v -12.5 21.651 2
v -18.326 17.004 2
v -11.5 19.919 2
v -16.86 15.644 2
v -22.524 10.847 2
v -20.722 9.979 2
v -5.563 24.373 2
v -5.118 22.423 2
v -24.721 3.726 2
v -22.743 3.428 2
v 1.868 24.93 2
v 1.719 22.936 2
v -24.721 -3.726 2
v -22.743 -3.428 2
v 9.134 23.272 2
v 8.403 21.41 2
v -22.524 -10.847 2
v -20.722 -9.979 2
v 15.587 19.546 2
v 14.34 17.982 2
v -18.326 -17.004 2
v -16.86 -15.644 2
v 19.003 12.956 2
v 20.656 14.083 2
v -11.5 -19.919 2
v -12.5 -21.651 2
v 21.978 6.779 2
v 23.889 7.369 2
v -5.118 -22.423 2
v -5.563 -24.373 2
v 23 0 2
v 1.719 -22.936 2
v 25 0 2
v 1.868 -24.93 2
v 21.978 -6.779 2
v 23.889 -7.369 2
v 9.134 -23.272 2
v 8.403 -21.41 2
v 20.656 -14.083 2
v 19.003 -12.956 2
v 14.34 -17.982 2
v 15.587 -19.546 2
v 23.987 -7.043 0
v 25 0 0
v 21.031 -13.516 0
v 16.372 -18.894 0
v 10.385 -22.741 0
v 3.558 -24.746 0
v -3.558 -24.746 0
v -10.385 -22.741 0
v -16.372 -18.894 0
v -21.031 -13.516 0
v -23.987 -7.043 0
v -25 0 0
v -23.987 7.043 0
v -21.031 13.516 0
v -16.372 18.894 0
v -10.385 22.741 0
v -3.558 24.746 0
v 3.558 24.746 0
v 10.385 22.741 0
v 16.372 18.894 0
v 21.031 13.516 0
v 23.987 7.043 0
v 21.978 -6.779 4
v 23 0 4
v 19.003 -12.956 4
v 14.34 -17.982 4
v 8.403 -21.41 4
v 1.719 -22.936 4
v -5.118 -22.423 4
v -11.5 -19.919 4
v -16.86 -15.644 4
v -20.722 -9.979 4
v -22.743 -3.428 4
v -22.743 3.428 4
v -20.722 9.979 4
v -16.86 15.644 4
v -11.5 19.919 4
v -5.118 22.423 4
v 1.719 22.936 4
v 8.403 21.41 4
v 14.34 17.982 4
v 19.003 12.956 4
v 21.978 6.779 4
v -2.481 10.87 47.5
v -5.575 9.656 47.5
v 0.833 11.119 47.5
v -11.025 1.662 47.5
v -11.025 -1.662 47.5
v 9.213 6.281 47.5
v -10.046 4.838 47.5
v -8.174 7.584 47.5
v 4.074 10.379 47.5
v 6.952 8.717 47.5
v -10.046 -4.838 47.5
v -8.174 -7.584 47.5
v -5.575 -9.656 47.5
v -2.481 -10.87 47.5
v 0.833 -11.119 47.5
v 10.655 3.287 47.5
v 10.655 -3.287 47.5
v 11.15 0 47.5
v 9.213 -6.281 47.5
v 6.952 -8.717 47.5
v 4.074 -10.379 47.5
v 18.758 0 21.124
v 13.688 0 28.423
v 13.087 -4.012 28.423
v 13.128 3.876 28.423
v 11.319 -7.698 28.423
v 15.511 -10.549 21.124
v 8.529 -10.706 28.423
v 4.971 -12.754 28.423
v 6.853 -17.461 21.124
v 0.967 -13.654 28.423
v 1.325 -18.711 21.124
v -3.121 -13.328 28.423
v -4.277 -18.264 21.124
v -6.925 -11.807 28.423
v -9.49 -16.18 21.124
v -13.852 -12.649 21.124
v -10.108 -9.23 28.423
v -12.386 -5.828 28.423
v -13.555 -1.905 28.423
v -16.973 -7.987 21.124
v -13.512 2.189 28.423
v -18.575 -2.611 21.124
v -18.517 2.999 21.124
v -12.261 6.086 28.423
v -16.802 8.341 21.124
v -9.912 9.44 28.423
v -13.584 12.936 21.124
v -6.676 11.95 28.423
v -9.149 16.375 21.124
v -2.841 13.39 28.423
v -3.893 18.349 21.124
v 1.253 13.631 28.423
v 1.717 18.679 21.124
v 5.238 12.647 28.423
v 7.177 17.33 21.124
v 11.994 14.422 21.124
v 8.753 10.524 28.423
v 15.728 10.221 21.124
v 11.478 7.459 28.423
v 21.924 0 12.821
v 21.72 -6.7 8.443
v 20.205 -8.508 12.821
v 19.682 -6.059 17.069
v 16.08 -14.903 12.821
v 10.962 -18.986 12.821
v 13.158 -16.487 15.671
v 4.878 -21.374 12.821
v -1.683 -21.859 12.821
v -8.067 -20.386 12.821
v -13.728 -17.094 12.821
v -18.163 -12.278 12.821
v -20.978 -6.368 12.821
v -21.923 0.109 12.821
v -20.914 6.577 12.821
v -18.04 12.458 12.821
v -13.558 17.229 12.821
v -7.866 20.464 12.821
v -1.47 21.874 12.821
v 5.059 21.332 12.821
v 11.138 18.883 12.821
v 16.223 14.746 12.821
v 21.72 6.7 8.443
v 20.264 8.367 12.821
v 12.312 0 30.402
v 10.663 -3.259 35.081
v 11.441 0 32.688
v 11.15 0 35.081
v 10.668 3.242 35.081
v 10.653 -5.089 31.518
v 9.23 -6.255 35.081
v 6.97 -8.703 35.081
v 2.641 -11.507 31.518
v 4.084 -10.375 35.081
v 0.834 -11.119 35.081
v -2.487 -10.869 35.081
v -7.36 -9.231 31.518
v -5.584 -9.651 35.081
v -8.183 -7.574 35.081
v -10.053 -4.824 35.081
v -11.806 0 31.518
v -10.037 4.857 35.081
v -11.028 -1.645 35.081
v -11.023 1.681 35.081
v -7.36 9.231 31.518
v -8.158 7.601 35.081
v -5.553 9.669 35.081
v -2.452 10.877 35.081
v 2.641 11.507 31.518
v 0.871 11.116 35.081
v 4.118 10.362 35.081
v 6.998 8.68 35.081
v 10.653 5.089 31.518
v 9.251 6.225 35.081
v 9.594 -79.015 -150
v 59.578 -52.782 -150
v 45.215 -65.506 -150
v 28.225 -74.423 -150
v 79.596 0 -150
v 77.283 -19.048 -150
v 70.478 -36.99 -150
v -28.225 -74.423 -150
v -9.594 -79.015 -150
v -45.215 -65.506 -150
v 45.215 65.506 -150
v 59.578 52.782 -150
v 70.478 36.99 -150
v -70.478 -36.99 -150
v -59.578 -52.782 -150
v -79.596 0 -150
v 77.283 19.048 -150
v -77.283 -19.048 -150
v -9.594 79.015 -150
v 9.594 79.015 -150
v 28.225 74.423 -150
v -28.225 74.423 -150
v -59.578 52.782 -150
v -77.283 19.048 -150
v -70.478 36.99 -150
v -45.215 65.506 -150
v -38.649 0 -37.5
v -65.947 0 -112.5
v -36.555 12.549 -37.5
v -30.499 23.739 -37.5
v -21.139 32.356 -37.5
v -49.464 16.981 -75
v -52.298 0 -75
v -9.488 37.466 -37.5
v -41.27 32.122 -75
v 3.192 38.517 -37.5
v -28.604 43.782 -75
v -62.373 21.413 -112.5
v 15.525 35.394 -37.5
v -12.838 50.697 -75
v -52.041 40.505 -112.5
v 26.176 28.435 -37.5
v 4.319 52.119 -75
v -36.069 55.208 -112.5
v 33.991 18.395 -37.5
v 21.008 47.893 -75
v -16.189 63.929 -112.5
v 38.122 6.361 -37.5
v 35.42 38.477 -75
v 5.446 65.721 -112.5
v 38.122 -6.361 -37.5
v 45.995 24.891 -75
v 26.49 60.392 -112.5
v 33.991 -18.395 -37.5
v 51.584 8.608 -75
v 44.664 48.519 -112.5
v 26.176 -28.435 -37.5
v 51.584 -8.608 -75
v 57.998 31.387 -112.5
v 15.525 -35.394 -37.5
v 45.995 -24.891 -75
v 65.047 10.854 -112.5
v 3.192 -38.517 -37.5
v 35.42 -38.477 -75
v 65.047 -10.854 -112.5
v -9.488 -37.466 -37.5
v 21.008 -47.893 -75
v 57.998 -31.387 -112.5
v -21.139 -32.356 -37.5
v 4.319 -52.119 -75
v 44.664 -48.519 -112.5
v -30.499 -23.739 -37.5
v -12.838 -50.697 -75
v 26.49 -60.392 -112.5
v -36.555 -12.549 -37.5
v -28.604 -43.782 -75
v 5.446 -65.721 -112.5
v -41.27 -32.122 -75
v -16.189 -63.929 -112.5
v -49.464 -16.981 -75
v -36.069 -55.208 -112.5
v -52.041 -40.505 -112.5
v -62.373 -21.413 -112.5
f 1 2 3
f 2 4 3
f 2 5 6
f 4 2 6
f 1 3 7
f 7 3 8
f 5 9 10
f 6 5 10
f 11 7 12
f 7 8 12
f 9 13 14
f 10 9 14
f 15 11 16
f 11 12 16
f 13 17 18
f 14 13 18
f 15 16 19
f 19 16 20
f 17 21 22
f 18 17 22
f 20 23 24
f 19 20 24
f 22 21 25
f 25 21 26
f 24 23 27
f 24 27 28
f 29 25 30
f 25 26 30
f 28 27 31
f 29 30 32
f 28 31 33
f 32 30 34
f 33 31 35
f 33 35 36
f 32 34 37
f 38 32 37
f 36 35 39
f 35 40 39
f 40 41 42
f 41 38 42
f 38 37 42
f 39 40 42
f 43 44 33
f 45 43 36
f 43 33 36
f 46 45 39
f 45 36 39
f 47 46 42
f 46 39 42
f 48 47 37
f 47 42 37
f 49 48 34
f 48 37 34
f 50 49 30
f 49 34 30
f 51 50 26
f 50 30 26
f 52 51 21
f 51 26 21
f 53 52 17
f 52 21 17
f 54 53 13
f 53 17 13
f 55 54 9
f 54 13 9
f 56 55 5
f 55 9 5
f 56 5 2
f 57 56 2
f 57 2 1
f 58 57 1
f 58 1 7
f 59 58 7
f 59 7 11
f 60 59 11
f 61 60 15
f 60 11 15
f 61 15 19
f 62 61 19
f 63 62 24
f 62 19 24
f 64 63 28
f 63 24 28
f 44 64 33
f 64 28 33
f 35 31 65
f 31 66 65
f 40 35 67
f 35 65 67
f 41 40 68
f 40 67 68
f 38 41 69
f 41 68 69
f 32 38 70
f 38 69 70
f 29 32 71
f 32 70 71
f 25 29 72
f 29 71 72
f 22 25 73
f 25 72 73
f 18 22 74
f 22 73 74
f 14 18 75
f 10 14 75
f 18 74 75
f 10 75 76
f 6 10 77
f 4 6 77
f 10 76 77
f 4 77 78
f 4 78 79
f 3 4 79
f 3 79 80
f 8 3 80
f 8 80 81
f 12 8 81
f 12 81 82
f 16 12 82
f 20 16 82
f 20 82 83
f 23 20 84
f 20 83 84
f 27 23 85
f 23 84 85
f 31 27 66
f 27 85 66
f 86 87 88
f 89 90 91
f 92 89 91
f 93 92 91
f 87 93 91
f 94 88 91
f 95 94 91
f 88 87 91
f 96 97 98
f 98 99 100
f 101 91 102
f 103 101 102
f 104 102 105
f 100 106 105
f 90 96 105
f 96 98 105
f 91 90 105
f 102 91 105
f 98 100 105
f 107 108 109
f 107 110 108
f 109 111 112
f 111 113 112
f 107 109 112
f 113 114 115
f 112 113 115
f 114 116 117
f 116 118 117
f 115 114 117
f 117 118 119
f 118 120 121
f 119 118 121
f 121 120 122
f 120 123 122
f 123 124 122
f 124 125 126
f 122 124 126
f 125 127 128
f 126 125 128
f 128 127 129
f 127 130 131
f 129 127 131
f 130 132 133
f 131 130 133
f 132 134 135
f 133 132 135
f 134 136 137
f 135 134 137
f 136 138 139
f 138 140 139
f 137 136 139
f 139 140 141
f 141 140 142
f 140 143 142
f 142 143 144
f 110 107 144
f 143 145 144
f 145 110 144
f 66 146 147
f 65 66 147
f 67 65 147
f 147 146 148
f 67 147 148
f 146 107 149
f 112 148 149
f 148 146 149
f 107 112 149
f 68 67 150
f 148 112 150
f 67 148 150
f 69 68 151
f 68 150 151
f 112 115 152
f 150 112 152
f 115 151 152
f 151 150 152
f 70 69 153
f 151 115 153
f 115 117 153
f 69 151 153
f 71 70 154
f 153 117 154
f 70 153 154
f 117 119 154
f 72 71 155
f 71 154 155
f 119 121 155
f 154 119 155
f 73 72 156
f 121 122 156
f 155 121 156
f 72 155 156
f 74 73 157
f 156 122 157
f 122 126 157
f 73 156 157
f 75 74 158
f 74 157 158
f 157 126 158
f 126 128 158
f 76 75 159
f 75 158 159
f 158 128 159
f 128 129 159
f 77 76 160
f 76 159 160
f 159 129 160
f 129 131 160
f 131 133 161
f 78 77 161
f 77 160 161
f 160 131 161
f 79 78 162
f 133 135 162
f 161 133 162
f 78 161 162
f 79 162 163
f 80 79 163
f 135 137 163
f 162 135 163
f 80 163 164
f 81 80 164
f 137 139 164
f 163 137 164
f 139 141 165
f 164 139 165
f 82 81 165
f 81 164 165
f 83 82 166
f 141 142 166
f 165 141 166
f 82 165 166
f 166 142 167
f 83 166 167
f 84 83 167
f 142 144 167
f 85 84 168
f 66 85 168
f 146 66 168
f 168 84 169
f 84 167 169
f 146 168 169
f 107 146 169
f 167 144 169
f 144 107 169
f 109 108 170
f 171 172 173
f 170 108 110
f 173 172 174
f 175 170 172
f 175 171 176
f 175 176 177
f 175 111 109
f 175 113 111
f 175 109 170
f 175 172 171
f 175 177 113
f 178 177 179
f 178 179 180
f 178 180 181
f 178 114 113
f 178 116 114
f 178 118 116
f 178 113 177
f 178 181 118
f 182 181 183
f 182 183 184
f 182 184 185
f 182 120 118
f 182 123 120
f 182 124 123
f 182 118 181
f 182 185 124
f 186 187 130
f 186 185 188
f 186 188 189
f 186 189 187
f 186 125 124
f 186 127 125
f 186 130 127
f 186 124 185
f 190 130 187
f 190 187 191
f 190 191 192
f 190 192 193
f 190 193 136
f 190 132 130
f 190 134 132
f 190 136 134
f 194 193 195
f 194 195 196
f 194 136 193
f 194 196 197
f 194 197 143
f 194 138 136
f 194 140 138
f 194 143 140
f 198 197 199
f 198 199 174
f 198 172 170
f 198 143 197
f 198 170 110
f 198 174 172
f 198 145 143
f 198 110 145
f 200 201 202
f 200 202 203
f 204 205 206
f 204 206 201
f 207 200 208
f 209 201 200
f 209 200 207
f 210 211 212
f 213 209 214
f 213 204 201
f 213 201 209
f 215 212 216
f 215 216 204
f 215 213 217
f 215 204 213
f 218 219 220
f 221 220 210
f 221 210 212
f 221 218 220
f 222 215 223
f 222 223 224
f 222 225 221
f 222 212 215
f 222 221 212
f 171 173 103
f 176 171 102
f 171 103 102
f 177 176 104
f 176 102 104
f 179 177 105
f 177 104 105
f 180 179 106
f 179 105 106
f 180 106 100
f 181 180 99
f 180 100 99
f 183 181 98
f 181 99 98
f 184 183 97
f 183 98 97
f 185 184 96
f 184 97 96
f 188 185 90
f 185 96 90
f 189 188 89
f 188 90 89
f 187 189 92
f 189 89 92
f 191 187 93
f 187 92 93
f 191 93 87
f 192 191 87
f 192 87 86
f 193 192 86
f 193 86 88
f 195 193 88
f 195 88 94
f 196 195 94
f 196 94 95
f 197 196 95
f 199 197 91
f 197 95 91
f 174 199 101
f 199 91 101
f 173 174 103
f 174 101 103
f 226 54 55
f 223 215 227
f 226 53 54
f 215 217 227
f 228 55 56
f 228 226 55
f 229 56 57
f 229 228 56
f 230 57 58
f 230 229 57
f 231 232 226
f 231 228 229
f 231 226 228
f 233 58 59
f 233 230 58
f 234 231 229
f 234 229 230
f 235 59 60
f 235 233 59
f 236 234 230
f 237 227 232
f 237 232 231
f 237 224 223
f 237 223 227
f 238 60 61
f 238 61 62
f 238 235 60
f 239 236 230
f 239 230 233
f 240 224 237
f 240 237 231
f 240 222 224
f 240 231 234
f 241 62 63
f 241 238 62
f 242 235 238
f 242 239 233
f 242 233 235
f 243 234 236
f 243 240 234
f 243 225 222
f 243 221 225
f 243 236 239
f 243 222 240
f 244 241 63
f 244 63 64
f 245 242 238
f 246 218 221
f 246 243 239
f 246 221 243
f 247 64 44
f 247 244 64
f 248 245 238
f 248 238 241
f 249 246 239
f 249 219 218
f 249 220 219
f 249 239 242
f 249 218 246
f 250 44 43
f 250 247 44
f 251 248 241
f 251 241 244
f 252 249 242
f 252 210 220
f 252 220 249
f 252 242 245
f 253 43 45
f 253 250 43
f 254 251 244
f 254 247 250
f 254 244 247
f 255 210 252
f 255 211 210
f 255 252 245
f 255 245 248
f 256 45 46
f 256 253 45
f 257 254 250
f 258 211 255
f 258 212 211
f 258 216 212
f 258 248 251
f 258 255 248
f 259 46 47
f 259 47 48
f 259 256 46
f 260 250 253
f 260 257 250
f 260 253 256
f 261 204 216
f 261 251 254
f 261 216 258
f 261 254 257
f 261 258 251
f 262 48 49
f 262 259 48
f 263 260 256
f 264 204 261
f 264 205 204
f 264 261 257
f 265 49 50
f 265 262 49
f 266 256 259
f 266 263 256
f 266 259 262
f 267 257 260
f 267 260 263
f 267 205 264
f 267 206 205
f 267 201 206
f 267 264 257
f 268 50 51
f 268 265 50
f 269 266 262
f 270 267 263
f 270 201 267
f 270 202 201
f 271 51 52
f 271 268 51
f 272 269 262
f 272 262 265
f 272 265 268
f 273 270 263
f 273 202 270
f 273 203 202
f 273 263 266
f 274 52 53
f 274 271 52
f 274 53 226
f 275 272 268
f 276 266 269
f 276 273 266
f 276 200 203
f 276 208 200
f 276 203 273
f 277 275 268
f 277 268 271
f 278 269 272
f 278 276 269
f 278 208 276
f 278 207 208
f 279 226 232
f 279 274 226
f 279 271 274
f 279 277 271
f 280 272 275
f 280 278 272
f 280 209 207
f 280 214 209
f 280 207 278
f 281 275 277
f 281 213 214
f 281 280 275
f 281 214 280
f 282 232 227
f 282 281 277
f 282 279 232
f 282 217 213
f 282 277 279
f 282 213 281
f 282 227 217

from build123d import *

# Parameters (mm, degrees)
FILLET1_R = 10


with BuildPart() as part:
    # Sketch1 → Revolve1 (revolve)
    with BuildSketch(Plane.YZ, mode=Mode.PRIVATE) as revolve1_sk:
        with BuildLine():
            Line((0, 0), (-25, 0))
            Line((-25, 0), (-25, 2))
            Line((-25, 2), (-23, 2))
            Line((-23, 2), (-23, 4))
            ThreePointArc((-23, 4), (-19.907119135, 18.74298562), (-11.15, 31))
            Line((-11.15, 31), (-11.15, 47.5))
            Line((-11.15, 47.5), (0, 47.5))
            Line((0, 47.5), (0, 0))
        make_face()
    revolve(revolve1_sk.sketch.rotate(Axis((0, 0, 47.5), (0, 0, -1)), 270), axis=Axis((0, 0, 47.5), (0, 0, -1)))

    # Fillet1
    fillet1_edges = [part.edges().sort_by_distance(p)[0] for p in [
        (-11.15, 0, 31),
    ]]
    fillet(fillet1_edges, radius=FILLET1_R)

    # Sketch2 → Revolve2 (revolve)
    with BuildSketch(Plane.YZ, mode=Mode.PRIVATE) as revolve2_sk:
        Polygon((-25, 0), (-79.59553514, -150), (0, -150), (0, 0), align=None)
    revolve(revolve2_sk.sketch.rotate(Axis((0, 0, 0), (0, 0, -1)), 90), axis=Axis((0, 0, 0), (0, 0, -1)))


solid = part.part
